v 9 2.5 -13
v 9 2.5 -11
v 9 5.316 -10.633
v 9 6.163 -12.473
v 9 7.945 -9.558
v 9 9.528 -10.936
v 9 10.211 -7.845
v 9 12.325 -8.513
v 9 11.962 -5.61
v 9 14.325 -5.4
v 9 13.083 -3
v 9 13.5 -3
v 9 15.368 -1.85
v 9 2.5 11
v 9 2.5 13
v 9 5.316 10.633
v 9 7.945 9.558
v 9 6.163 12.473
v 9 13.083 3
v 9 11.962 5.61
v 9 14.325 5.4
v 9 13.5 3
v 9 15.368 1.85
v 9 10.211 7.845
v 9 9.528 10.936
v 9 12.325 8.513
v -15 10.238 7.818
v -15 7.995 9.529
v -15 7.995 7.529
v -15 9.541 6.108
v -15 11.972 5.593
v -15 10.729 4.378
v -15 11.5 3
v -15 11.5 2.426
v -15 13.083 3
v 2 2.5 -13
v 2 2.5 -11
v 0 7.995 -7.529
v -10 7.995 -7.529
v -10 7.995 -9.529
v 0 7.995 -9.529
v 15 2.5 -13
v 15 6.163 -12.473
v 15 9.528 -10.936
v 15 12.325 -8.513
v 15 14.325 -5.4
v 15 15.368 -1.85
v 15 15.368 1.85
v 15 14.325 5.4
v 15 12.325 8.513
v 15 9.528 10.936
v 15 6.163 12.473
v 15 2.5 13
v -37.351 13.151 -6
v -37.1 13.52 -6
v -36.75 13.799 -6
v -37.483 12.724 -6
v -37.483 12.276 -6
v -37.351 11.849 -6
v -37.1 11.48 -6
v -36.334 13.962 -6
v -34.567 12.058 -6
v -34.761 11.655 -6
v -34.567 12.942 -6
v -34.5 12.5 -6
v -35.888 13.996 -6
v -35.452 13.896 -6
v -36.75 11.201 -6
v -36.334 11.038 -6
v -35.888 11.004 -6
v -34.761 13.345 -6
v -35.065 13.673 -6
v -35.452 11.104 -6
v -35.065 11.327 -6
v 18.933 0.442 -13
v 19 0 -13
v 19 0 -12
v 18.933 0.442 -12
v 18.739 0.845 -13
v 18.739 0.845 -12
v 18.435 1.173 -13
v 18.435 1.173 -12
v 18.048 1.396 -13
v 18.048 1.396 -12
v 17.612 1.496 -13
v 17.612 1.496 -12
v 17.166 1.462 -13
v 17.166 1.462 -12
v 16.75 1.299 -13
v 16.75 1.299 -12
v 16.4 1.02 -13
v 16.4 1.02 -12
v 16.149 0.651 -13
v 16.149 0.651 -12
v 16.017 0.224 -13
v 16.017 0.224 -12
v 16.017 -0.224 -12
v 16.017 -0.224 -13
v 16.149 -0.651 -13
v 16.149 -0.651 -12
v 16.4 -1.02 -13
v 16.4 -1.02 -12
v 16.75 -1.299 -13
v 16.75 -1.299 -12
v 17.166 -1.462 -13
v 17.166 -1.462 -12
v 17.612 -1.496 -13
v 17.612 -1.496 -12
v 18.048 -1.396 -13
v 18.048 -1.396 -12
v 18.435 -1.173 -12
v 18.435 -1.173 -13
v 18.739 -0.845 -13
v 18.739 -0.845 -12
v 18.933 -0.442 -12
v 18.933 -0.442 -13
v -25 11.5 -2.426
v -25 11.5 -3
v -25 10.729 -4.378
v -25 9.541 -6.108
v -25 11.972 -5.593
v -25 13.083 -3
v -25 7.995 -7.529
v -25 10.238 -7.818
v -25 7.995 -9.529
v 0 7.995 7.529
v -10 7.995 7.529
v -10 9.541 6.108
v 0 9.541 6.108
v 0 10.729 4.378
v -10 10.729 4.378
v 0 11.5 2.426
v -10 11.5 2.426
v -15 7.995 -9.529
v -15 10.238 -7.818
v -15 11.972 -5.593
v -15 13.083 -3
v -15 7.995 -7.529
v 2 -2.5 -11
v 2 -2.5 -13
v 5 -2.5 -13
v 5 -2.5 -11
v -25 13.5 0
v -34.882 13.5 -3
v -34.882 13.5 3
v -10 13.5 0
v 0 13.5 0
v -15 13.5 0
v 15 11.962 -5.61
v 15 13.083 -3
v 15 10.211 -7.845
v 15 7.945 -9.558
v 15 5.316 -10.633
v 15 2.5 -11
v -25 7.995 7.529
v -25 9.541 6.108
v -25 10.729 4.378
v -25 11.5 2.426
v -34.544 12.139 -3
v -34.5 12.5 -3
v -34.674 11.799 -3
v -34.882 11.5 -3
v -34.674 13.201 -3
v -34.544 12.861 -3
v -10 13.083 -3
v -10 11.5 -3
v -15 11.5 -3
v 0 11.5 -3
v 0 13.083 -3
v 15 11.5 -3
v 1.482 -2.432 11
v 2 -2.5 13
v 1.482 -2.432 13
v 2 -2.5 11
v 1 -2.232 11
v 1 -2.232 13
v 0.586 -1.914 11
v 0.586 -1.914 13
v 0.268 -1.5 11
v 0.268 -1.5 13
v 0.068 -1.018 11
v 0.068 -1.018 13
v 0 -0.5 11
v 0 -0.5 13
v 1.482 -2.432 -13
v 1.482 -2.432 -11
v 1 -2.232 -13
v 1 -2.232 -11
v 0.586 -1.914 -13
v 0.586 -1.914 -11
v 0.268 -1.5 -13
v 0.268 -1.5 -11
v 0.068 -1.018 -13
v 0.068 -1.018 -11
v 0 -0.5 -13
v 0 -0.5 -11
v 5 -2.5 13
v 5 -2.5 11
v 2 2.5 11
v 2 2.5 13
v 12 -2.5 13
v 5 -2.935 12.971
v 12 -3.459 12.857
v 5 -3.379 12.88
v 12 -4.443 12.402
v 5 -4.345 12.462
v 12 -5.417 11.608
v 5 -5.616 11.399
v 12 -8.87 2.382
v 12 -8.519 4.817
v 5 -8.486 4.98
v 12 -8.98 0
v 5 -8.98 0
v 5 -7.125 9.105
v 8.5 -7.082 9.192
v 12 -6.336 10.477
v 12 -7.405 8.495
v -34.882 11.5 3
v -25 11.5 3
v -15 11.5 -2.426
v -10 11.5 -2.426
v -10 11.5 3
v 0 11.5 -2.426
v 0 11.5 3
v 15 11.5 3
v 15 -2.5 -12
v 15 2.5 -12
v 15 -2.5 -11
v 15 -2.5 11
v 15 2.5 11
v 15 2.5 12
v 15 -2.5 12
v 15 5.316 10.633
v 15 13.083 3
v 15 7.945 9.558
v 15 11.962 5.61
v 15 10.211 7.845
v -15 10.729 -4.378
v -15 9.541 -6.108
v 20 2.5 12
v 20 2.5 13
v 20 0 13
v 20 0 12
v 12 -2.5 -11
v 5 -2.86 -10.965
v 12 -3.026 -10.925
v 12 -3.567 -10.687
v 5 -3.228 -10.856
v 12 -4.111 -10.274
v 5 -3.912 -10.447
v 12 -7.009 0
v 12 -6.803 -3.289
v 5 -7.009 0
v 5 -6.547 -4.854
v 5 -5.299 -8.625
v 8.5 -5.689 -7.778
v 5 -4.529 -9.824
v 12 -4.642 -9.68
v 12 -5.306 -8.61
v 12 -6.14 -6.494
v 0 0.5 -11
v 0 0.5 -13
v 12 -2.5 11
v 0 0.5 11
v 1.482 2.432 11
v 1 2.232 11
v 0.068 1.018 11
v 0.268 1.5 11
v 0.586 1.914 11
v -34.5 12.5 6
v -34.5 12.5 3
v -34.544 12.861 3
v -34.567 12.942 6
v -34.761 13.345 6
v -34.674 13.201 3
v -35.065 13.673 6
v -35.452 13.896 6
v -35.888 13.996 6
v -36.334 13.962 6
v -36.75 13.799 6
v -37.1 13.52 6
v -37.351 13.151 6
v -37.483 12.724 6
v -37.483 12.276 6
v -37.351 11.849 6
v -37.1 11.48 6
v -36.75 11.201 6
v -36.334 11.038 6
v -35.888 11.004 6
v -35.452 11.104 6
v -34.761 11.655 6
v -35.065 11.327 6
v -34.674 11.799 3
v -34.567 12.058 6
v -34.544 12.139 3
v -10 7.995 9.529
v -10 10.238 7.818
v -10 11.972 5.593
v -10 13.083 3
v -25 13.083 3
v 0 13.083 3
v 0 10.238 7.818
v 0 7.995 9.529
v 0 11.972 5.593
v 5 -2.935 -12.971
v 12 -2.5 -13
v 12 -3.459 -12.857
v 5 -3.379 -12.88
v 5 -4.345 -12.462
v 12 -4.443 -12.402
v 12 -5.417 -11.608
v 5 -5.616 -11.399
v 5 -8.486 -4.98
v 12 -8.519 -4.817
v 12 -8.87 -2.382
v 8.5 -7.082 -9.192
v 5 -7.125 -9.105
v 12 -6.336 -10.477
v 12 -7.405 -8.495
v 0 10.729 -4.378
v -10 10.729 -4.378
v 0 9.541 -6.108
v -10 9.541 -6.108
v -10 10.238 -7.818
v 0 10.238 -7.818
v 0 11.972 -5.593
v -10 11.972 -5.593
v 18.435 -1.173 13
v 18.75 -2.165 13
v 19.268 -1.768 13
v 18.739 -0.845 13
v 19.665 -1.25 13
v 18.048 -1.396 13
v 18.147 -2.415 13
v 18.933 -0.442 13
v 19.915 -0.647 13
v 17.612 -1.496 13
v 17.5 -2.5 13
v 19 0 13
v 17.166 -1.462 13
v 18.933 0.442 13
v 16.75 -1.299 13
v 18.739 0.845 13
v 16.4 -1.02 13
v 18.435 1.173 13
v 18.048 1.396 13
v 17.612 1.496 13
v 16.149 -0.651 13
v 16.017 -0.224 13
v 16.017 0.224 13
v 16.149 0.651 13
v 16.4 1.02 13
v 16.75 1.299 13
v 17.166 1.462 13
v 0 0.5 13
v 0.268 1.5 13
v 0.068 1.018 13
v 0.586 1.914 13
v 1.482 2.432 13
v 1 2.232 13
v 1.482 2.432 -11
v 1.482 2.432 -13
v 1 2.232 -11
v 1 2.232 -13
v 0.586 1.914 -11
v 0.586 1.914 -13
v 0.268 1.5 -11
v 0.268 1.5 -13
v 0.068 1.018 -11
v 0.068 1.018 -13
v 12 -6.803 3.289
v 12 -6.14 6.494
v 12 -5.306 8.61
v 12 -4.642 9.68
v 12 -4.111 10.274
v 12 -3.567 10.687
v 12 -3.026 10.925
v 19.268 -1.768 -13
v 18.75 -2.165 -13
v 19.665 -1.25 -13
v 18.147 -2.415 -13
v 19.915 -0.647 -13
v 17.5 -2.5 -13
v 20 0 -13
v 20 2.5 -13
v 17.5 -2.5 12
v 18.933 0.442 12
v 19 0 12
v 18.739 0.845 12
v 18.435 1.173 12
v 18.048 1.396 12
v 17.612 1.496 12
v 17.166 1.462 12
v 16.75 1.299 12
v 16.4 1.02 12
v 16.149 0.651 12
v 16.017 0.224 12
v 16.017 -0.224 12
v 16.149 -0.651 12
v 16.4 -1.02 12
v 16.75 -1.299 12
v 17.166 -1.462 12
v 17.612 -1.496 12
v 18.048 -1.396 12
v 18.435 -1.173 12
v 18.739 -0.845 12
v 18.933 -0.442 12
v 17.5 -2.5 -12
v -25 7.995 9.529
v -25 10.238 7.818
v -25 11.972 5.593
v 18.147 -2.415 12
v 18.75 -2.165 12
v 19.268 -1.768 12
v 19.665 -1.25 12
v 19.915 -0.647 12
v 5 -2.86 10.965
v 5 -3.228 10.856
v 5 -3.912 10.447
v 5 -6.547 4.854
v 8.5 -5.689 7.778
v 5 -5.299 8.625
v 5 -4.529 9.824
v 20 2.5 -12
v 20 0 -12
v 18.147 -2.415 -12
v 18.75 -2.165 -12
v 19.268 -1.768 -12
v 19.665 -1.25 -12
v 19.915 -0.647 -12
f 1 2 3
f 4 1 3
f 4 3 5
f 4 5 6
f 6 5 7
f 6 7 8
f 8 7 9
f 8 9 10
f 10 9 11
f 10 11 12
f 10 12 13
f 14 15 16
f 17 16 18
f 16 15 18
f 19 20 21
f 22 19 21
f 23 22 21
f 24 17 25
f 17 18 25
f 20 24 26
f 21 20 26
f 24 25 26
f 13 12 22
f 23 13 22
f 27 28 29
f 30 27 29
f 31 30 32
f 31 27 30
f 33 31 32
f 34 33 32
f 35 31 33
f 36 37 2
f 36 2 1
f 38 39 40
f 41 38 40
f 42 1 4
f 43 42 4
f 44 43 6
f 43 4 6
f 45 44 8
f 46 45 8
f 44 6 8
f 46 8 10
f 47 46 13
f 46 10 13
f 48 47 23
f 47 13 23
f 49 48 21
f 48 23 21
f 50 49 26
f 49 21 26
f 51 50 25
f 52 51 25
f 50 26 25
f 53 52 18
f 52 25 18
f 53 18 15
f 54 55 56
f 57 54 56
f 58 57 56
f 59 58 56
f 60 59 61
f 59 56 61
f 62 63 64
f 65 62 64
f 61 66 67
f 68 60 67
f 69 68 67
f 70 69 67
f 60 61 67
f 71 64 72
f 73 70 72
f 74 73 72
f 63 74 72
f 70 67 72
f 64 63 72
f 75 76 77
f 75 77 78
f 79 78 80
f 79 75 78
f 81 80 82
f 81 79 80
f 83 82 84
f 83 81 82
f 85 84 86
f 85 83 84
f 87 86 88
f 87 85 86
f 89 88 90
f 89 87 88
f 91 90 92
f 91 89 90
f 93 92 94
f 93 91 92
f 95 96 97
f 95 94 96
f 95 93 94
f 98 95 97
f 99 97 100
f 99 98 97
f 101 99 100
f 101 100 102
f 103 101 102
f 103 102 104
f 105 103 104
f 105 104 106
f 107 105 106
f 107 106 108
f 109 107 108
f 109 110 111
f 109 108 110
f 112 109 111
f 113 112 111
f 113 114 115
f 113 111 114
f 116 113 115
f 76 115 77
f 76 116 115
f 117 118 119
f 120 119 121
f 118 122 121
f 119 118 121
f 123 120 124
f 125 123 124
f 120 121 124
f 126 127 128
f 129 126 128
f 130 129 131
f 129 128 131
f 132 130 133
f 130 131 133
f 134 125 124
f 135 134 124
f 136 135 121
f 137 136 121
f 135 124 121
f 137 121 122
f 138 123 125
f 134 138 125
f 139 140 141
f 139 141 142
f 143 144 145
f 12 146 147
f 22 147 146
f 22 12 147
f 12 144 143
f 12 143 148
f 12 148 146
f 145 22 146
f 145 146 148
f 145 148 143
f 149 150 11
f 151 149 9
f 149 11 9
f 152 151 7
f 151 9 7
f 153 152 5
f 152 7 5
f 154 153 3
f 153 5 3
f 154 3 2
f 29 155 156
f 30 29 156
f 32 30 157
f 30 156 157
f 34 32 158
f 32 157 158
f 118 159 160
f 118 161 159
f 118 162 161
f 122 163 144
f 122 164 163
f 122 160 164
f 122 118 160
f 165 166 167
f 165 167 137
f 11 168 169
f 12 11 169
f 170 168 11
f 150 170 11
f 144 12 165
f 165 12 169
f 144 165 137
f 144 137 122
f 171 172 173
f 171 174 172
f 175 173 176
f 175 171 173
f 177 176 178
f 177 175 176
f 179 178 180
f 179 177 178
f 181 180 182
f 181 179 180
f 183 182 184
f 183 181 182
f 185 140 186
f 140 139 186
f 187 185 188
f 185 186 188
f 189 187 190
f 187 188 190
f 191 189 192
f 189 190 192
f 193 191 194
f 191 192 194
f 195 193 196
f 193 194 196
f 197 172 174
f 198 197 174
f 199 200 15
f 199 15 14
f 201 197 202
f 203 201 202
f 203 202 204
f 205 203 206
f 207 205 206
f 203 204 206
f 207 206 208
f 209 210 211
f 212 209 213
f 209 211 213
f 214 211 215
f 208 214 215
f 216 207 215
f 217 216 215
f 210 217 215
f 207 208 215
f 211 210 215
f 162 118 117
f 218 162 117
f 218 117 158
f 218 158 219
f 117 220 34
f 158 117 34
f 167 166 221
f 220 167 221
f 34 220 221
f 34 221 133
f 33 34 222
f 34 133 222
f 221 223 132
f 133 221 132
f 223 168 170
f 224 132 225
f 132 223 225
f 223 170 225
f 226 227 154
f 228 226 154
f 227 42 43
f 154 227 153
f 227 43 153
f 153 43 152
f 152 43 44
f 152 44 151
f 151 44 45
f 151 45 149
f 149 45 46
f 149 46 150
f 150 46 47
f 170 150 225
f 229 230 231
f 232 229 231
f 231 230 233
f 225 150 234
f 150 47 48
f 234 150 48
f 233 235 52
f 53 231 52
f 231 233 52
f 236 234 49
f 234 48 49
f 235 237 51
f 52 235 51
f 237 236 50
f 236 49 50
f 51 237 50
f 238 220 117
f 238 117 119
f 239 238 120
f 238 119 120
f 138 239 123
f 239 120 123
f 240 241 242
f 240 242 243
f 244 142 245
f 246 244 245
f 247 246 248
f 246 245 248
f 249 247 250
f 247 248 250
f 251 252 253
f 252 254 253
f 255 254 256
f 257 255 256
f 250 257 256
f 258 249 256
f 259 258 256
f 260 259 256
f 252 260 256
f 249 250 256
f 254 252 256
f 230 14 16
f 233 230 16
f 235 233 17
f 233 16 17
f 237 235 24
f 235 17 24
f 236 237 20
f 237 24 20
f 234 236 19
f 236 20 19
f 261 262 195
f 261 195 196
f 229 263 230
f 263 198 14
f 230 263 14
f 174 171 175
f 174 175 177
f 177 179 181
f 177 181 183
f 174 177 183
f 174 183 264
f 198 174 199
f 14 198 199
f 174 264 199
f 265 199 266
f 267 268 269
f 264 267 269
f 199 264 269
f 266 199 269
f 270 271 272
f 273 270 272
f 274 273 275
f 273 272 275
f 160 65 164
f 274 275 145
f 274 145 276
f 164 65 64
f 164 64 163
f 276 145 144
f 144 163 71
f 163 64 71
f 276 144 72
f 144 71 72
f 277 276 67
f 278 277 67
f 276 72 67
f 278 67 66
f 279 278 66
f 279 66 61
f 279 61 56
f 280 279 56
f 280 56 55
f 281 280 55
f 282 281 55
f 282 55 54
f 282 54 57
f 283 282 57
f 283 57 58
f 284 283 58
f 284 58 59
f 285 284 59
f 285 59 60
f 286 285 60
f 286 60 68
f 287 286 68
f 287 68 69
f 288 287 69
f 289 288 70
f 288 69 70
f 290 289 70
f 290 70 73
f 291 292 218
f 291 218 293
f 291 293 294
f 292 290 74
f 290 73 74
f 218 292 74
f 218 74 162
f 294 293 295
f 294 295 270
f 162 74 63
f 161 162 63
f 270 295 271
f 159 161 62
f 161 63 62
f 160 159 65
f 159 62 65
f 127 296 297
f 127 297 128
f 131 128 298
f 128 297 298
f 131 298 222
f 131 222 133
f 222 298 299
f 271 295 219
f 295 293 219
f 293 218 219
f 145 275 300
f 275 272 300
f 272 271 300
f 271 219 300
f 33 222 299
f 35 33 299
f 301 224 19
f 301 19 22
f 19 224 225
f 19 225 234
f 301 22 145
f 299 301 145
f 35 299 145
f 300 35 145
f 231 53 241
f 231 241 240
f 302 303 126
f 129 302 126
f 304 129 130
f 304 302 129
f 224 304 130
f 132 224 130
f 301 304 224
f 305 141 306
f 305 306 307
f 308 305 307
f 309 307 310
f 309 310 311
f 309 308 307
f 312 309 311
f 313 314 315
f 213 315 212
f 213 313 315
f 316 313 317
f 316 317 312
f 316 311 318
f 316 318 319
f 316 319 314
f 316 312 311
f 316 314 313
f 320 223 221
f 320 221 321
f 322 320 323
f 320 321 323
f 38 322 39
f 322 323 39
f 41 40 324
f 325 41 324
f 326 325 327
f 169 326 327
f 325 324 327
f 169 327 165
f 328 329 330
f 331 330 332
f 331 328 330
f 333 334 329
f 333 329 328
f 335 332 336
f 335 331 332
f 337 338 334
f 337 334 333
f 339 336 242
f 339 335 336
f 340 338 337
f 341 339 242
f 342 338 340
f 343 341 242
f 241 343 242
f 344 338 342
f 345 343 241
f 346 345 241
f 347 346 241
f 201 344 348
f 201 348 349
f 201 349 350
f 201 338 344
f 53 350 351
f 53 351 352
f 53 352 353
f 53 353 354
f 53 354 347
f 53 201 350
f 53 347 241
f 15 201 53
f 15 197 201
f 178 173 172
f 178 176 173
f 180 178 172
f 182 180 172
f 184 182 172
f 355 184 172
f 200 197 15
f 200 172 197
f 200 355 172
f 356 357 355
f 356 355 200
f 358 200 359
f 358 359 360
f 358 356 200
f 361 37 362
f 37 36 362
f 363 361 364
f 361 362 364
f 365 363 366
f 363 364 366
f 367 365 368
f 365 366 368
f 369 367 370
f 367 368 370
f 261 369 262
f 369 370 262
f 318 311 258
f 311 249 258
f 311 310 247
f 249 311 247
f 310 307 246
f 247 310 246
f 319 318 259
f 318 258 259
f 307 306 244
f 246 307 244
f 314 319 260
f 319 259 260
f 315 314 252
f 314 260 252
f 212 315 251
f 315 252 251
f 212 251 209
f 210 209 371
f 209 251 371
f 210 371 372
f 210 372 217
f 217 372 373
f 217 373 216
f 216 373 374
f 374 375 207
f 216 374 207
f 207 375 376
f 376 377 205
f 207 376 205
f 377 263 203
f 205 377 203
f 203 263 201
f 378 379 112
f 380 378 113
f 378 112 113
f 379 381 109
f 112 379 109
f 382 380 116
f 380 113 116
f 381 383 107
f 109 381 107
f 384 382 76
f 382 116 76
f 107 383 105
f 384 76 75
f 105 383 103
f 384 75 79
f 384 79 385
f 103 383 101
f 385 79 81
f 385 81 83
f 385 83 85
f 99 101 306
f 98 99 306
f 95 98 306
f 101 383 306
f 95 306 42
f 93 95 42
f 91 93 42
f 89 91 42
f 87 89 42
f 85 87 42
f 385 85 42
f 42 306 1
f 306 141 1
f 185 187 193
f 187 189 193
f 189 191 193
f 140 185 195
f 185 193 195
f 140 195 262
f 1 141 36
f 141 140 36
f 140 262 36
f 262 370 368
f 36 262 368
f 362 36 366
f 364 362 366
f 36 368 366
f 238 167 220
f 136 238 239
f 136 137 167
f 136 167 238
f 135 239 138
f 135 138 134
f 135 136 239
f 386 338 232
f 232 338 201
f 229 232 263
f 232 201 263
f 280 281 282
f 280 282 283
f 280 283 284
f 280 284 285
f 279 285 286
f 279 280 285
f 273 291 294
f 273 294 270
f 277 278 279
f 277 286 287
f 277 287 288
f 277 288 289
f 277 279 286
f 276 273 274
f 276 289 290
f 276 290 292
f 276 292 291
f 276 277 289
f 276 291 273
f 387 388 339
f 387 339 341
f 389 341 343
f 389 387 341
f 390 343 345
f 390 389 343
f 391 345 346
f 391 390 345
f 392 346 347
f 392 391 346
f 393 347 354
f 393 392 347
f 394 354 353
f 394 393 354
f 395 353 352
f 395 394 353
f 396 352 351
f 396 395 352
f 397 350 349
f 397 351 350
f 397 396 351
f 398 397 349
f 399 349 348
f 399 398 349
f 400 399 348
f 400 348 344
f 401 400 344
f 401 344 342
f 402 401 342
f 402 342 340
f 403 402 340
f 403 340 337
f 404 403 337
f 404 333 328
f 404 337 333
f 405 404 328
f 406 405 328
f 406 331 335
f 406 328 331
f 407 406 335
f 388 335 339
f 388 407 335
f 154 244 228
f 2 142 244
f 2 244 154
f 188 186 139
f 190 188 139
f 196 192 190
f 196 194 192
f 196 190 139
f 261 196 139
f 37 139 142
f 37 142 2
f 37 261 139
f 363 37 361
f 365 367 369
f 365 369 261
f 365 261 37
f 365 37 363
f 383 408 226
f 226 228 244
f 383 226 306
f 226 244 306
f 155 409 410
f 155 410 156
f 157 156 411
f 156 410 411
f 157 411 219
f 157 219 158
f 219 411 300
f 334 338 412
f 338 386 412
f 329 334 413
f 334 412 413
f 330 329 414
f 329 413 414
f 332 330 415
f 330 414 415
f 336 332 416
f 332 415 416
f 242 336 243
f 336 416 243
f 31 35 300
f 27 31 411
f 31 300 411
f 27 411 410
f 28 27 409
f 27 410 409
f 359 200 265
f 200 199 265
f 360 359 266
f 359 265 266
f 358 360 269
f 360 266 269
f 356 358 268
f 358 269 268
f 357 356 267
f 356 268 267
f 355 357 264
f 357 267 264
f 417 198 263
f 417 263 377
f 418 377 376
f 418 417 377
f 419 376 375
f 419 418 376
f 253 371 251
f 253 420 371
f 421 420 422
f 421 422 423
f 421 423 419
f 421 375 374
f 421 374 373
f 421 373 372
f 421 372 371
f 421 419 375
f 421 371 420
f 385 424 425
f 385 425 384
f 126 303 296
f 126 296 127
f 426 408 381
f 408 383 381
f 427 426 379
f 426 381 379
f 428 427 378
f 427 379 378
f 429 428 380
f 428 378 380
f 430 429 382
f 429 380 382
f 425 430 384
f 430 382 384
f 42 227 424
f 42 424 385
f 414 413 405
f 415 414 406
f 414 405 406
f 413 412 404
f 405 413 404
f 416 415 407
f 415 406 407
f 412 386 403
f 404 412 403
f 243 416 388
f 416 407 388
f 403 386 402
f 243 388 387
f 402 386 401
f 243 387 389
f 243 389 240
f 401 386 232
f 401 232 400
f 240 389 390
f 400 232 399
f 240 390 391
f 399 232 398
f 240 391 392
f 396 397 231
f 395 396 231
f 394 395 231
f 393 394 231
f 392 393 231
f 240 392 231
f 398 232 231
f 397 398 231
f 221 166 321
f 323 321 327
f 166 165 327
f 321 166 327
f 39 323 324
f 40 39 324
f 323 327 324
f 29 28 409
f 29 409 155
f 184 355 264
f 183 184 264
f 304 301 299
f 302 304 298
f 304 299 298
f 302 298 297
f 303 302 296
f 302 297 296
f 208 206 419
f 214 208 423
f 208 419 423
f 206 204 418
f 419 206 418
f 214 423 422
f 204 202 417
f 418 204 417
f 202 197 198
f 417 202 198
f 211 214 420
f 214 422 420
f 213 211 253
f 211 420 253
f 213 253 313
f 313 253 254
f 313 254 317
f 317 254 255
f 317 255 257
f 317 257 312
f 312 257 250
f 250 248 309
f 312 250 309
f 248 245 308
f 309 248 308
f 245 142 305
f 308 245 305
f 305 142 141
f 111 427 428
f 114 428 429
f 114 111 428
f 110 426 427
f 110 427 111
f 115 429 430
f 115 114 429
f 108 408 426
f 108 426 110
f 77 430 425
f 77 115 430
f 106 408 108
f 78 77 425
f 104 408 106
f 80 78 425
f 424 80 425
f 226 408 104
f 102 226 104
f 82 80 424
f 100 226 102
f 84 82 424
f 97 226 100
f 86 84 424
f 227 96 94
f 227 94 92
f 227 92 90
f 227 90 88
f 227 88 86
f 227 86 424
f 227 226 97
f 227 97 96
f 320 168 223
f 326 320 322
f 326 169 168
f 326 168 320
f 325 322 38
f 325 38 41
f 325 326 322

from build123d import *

# Parameters (mm, degrees)
SKETCH1_W                = 2
SKETCH1_H                = 5
BOSS_EXTRUDE1_DEPTH      = 15
BOSS_EXTRUDE1_2_DEPTH    = 15
SKETCH2_W                = 1
SKETCH2_H                = 5
BOSS_EXTRUDE2_DEPTH      = 5
CUT_EXTRUDE1_DEPTH       = 33.113081447
CUT_EXTRUDE1_DEPTH_BACK  = 33.113081447
SKETCH3_R                = 1.5
SWEEP1_START             = 9
SWEEP1_DEPTH             = 6
BOSS_EXTRUDE3_DEPTH      = 12
CUT_EXTRUDE2_DEPTH       = 5
FILLET1_R                = 2
BOSS_EXTRUDE6_START      = -6
SKETCH7_W                = 6
SKETCH7_H                = 2
BOSS_EXTRUDE6_DEPTH      = 51
BOSS_EXTRUDE7_DEPTH      = 3
BOSS_EXTRUDE7_DEPTH_BACK = 9
SKETCH8_R                = 1.5
FILLET2_R                = 2.5
BOSS_EXTRUDE10_DEPTH     = 10
LPATTERN1_COUNT          = 2
LPATTERN1_PITCH          = 15


# Read off the part's stored shape, not the designer's step: Sweep1
with BuildPart() as part:
    # Sketch1 → Boss-Extrude1 (new body)
    with BuildSketch(Plane(origin=(0, 0, 0), x_dir=(0, 0, -1), z_dir=(1, 0, 0))):
        with Locations((-12, 0)):
            Rectangle(SKETCH1_W, SKETCH1_H)
    extrude(amount=BOSS_EXTRUDE1_DEPTH)



with BuildPart() as body_2:
    # Sketch1 → Boss-Extrude1 2 (new body)
    with BuildSketch(Plane(origin=(0, 0, 0), x_dir=(0, 0, -1), z_dir=(1, 0, 0))):
        with Locations((12, 0)):
            Rectangle(SKETCH1_W, SKETCH1_H)
    extrude(amount=BOSS_EXTRUDE1_2_DEPTH)


with BuildPart() as part_1:
    add(part.part)

    add(body_2.part)  # Boss-Extrude2 merges body 2
    # Sketch2 → Boss-Extrude2 (add)
    with BuildSketch(Plane(origin=(15, 0, 0), x_dir=(0, 0, -1), z_dir=(1, 0, 0))):
        with Locations((12.5, 0)):
            Rectangle(SKETCH2_W, SKETCH2_H)
        with Locations((-12.5, 0)):
            Rectangle(SKETCH2_W, SKETCH2_H)
    extrude(amount=BOSS_EXTRUDE2_DEPTH)

    # Sketch3 → Cut-Extrude1 (cut, two sides: drawn at the far end of the back side and taken through both)
    with BuildSketch(Plane.XY.offset(-12).offset(-CUT_EXTRUDE1_DEPTH_BACK)):
        with Locations((17.5, 0)):
            Circle(SKETCH3_R)
    extrude(amount=CUT_EXTRUDE1_DEPTH + CUT_EXTRUDE1_DEPTH_BACK, mode=Mode.SUBTRACT)

    # Sweep1 outline → Sweep1 (add)
    with BuildSketch(Plane.YZ.offset(SWEEP1_START)):
        with BuildLine():
            ThreePointArc((2.5, -13), (15.5, 0), (2.5, 13))
            Line((2.5, 13), (2.5, 11))
            ThreePointArc((2.5, 11), (13.5, 0), (2.5, -11))
            Line((2.5, -11), (2.5, -13))
        make_face()
    extrude(amount=SWEEP1_DEPTH)

    # Sketch5 → Boss-Extrude3 (add)
    with BuildSketch(Plane(origin=(0, 0, 0), x_dir=(0, 0, -1), z_dir=(1, 0, 0))):
        with BuildLine():
            Line((-11, -2.5), (-13, -2.5))
            add(Edge.make_bspline(
                [(-13, -2.5), (-13, -8.980170496), (0, -8.980170496)],
                knots=[3.141592654, 3.141592654, 3.141592654, 4.71238898, 4.71238898, 4.71238898], degree=2, weights=[1, 0.707106781, 1]))
            Line((0, -8.980170496), (0, -7.009343108))
            add(Edge.make_bspline(
                [(-11, -2.5), (-11, -7.009343108), (0, -7.009343108)],
                knots=[3.141592654, 3.141592654, 3.141592654, 4.71238898, 4.71238898, 4.71238898], degree=2, weights=[1, 0.707106781, 1]))
        make_face()
    boss_extrude3 = extrude(amount=BOSS_EXTRUDE3_DEPTH)

    # Sketch6 → Cut-Extrude2 (cut)
    with BuildSketch(Plane.ZY):
        with BuildLine():
            Line((13, -2.5), (11, -2.5))
            add(Edge.make_bspline(
                [(0, -7.009343108), (11, -7.009343108), (11, -2.5)],
                knots=[4.71238898, 4.71238898, 4.71238898, 6.283185307, 6.283185307, 6.283185307], degree=2, weights=[1, 0.707106781, 1]))
            Line((0, -7.009343108), (0, -8.980170496))
            add(Edge.make_bspline(
                [(0, -8.980170496), (13, -8.980170496), (13, -2.5)],
                knots=[4.71238898, 4.71238898, 4.71238898, 6.283185307, 6.283185307, 6.283185307], degree=2, weights=[1, 0.707106781, 1]))
        make_face()
    cut_extrude2 = extrude(amount=-CUT_EXTRUDE2_DEPTH, mode=Mode.SUBTRACT)

    # Mirror2: Boss-Extrude3, Cut-Extrude2 across plane
    add(boss_extrude3.mirror(Plane(origin=(12, -8.980170496, 0), x_dir=(1, 0, 0), z_dir=(0, 0, 1))))
    add(cut_extrude2.mirror(Plane(origin=(12, -8.980170496, 0), x_dir=(1, 0, 0), z_dir=(0, 0, 1))), mode=Mode.SUBTRACT)

    # Fillet1
    fillet1_edges = [part_1.edges().sort_by_distance(p)[0] for p in [
        (0, -2.5, -12),
        (0, 2.5, -12),
        (0, 2.5, 12),
        (0, -2.5, 12),
    ]]
    fillet(fillet1_edges, radius=FILLET1_R)

    # Sketch7 → Boss-Extrude6 (add)
    with BuildSketch(Plane.ZY.offset(-9).offset(BOSS_EXTRUDE6_START)):
        with Locations((0, 12.5)):
            Rectangle(SKETCH7_W, SKETCH7_H)
    extrude(amount=BOSS_EXTRUDE6_DEPTH)

    # Sketch8 → Boss-Extrude7 (add, two sides: drawn at the far end of the back side and taken through both)
    with BuildSketch(Plane.XY.offset(3).offset(-BOSS_EXTRUDE7_DEPTH_BACK)):
        with Locations((-36, 12.5)):
            Circle(SKETCH8_R)
    extrude(amount=BOSS_EXTRUDE7_DEPTH + BOSS_EXTRUDE7_DEPTH_BACK)

    # Fillet2
    fillet2_edges = [part_1.edges().sort_by_distance(p)[0] for p in [
        (20, -2.5, -12.5),
        (20, -2.5, 12.5),
    ]]
    fillet(fillet2_edges, radius=FILLET2_R)

    # 3DSketch3 → Boss-Extrude10 (add)
    with BuildSketch(Plane(origin=(-10, 7.995255445, 9.529017137), x_dir=(0, 0, -1), z_dir=(1, 0, 0))):
        with BuildLine():
            Line((0, 0), (2, 0))
            ThreePointArc((2, 0), (9.529017137, 3.825899604), (17.058034273, 0))
            Line((17.058034273, 0), (19.058034273, 0))
            ThreePointArc((19.058034273, 0), (15.031388903, 4.029654263), (9.529017137, 5.504744555))
            ThreePointArc((9.529017137, 5.504744555), (4.026645371, 4.029654263), (0, 0))
        make_face()
    boss_extrude10 = extrude(amount=BOSS_EXTRUDE10_DEPTH)

    # LPattern1: Boss-Extrude10 ×2
    with Locations(*[(-i * LPATTERN1_PITCH, 0, 0) for i in range(1, LPATTERN1_COUNT)]):
        add(boss_extrude10)


solid = part_1.part
